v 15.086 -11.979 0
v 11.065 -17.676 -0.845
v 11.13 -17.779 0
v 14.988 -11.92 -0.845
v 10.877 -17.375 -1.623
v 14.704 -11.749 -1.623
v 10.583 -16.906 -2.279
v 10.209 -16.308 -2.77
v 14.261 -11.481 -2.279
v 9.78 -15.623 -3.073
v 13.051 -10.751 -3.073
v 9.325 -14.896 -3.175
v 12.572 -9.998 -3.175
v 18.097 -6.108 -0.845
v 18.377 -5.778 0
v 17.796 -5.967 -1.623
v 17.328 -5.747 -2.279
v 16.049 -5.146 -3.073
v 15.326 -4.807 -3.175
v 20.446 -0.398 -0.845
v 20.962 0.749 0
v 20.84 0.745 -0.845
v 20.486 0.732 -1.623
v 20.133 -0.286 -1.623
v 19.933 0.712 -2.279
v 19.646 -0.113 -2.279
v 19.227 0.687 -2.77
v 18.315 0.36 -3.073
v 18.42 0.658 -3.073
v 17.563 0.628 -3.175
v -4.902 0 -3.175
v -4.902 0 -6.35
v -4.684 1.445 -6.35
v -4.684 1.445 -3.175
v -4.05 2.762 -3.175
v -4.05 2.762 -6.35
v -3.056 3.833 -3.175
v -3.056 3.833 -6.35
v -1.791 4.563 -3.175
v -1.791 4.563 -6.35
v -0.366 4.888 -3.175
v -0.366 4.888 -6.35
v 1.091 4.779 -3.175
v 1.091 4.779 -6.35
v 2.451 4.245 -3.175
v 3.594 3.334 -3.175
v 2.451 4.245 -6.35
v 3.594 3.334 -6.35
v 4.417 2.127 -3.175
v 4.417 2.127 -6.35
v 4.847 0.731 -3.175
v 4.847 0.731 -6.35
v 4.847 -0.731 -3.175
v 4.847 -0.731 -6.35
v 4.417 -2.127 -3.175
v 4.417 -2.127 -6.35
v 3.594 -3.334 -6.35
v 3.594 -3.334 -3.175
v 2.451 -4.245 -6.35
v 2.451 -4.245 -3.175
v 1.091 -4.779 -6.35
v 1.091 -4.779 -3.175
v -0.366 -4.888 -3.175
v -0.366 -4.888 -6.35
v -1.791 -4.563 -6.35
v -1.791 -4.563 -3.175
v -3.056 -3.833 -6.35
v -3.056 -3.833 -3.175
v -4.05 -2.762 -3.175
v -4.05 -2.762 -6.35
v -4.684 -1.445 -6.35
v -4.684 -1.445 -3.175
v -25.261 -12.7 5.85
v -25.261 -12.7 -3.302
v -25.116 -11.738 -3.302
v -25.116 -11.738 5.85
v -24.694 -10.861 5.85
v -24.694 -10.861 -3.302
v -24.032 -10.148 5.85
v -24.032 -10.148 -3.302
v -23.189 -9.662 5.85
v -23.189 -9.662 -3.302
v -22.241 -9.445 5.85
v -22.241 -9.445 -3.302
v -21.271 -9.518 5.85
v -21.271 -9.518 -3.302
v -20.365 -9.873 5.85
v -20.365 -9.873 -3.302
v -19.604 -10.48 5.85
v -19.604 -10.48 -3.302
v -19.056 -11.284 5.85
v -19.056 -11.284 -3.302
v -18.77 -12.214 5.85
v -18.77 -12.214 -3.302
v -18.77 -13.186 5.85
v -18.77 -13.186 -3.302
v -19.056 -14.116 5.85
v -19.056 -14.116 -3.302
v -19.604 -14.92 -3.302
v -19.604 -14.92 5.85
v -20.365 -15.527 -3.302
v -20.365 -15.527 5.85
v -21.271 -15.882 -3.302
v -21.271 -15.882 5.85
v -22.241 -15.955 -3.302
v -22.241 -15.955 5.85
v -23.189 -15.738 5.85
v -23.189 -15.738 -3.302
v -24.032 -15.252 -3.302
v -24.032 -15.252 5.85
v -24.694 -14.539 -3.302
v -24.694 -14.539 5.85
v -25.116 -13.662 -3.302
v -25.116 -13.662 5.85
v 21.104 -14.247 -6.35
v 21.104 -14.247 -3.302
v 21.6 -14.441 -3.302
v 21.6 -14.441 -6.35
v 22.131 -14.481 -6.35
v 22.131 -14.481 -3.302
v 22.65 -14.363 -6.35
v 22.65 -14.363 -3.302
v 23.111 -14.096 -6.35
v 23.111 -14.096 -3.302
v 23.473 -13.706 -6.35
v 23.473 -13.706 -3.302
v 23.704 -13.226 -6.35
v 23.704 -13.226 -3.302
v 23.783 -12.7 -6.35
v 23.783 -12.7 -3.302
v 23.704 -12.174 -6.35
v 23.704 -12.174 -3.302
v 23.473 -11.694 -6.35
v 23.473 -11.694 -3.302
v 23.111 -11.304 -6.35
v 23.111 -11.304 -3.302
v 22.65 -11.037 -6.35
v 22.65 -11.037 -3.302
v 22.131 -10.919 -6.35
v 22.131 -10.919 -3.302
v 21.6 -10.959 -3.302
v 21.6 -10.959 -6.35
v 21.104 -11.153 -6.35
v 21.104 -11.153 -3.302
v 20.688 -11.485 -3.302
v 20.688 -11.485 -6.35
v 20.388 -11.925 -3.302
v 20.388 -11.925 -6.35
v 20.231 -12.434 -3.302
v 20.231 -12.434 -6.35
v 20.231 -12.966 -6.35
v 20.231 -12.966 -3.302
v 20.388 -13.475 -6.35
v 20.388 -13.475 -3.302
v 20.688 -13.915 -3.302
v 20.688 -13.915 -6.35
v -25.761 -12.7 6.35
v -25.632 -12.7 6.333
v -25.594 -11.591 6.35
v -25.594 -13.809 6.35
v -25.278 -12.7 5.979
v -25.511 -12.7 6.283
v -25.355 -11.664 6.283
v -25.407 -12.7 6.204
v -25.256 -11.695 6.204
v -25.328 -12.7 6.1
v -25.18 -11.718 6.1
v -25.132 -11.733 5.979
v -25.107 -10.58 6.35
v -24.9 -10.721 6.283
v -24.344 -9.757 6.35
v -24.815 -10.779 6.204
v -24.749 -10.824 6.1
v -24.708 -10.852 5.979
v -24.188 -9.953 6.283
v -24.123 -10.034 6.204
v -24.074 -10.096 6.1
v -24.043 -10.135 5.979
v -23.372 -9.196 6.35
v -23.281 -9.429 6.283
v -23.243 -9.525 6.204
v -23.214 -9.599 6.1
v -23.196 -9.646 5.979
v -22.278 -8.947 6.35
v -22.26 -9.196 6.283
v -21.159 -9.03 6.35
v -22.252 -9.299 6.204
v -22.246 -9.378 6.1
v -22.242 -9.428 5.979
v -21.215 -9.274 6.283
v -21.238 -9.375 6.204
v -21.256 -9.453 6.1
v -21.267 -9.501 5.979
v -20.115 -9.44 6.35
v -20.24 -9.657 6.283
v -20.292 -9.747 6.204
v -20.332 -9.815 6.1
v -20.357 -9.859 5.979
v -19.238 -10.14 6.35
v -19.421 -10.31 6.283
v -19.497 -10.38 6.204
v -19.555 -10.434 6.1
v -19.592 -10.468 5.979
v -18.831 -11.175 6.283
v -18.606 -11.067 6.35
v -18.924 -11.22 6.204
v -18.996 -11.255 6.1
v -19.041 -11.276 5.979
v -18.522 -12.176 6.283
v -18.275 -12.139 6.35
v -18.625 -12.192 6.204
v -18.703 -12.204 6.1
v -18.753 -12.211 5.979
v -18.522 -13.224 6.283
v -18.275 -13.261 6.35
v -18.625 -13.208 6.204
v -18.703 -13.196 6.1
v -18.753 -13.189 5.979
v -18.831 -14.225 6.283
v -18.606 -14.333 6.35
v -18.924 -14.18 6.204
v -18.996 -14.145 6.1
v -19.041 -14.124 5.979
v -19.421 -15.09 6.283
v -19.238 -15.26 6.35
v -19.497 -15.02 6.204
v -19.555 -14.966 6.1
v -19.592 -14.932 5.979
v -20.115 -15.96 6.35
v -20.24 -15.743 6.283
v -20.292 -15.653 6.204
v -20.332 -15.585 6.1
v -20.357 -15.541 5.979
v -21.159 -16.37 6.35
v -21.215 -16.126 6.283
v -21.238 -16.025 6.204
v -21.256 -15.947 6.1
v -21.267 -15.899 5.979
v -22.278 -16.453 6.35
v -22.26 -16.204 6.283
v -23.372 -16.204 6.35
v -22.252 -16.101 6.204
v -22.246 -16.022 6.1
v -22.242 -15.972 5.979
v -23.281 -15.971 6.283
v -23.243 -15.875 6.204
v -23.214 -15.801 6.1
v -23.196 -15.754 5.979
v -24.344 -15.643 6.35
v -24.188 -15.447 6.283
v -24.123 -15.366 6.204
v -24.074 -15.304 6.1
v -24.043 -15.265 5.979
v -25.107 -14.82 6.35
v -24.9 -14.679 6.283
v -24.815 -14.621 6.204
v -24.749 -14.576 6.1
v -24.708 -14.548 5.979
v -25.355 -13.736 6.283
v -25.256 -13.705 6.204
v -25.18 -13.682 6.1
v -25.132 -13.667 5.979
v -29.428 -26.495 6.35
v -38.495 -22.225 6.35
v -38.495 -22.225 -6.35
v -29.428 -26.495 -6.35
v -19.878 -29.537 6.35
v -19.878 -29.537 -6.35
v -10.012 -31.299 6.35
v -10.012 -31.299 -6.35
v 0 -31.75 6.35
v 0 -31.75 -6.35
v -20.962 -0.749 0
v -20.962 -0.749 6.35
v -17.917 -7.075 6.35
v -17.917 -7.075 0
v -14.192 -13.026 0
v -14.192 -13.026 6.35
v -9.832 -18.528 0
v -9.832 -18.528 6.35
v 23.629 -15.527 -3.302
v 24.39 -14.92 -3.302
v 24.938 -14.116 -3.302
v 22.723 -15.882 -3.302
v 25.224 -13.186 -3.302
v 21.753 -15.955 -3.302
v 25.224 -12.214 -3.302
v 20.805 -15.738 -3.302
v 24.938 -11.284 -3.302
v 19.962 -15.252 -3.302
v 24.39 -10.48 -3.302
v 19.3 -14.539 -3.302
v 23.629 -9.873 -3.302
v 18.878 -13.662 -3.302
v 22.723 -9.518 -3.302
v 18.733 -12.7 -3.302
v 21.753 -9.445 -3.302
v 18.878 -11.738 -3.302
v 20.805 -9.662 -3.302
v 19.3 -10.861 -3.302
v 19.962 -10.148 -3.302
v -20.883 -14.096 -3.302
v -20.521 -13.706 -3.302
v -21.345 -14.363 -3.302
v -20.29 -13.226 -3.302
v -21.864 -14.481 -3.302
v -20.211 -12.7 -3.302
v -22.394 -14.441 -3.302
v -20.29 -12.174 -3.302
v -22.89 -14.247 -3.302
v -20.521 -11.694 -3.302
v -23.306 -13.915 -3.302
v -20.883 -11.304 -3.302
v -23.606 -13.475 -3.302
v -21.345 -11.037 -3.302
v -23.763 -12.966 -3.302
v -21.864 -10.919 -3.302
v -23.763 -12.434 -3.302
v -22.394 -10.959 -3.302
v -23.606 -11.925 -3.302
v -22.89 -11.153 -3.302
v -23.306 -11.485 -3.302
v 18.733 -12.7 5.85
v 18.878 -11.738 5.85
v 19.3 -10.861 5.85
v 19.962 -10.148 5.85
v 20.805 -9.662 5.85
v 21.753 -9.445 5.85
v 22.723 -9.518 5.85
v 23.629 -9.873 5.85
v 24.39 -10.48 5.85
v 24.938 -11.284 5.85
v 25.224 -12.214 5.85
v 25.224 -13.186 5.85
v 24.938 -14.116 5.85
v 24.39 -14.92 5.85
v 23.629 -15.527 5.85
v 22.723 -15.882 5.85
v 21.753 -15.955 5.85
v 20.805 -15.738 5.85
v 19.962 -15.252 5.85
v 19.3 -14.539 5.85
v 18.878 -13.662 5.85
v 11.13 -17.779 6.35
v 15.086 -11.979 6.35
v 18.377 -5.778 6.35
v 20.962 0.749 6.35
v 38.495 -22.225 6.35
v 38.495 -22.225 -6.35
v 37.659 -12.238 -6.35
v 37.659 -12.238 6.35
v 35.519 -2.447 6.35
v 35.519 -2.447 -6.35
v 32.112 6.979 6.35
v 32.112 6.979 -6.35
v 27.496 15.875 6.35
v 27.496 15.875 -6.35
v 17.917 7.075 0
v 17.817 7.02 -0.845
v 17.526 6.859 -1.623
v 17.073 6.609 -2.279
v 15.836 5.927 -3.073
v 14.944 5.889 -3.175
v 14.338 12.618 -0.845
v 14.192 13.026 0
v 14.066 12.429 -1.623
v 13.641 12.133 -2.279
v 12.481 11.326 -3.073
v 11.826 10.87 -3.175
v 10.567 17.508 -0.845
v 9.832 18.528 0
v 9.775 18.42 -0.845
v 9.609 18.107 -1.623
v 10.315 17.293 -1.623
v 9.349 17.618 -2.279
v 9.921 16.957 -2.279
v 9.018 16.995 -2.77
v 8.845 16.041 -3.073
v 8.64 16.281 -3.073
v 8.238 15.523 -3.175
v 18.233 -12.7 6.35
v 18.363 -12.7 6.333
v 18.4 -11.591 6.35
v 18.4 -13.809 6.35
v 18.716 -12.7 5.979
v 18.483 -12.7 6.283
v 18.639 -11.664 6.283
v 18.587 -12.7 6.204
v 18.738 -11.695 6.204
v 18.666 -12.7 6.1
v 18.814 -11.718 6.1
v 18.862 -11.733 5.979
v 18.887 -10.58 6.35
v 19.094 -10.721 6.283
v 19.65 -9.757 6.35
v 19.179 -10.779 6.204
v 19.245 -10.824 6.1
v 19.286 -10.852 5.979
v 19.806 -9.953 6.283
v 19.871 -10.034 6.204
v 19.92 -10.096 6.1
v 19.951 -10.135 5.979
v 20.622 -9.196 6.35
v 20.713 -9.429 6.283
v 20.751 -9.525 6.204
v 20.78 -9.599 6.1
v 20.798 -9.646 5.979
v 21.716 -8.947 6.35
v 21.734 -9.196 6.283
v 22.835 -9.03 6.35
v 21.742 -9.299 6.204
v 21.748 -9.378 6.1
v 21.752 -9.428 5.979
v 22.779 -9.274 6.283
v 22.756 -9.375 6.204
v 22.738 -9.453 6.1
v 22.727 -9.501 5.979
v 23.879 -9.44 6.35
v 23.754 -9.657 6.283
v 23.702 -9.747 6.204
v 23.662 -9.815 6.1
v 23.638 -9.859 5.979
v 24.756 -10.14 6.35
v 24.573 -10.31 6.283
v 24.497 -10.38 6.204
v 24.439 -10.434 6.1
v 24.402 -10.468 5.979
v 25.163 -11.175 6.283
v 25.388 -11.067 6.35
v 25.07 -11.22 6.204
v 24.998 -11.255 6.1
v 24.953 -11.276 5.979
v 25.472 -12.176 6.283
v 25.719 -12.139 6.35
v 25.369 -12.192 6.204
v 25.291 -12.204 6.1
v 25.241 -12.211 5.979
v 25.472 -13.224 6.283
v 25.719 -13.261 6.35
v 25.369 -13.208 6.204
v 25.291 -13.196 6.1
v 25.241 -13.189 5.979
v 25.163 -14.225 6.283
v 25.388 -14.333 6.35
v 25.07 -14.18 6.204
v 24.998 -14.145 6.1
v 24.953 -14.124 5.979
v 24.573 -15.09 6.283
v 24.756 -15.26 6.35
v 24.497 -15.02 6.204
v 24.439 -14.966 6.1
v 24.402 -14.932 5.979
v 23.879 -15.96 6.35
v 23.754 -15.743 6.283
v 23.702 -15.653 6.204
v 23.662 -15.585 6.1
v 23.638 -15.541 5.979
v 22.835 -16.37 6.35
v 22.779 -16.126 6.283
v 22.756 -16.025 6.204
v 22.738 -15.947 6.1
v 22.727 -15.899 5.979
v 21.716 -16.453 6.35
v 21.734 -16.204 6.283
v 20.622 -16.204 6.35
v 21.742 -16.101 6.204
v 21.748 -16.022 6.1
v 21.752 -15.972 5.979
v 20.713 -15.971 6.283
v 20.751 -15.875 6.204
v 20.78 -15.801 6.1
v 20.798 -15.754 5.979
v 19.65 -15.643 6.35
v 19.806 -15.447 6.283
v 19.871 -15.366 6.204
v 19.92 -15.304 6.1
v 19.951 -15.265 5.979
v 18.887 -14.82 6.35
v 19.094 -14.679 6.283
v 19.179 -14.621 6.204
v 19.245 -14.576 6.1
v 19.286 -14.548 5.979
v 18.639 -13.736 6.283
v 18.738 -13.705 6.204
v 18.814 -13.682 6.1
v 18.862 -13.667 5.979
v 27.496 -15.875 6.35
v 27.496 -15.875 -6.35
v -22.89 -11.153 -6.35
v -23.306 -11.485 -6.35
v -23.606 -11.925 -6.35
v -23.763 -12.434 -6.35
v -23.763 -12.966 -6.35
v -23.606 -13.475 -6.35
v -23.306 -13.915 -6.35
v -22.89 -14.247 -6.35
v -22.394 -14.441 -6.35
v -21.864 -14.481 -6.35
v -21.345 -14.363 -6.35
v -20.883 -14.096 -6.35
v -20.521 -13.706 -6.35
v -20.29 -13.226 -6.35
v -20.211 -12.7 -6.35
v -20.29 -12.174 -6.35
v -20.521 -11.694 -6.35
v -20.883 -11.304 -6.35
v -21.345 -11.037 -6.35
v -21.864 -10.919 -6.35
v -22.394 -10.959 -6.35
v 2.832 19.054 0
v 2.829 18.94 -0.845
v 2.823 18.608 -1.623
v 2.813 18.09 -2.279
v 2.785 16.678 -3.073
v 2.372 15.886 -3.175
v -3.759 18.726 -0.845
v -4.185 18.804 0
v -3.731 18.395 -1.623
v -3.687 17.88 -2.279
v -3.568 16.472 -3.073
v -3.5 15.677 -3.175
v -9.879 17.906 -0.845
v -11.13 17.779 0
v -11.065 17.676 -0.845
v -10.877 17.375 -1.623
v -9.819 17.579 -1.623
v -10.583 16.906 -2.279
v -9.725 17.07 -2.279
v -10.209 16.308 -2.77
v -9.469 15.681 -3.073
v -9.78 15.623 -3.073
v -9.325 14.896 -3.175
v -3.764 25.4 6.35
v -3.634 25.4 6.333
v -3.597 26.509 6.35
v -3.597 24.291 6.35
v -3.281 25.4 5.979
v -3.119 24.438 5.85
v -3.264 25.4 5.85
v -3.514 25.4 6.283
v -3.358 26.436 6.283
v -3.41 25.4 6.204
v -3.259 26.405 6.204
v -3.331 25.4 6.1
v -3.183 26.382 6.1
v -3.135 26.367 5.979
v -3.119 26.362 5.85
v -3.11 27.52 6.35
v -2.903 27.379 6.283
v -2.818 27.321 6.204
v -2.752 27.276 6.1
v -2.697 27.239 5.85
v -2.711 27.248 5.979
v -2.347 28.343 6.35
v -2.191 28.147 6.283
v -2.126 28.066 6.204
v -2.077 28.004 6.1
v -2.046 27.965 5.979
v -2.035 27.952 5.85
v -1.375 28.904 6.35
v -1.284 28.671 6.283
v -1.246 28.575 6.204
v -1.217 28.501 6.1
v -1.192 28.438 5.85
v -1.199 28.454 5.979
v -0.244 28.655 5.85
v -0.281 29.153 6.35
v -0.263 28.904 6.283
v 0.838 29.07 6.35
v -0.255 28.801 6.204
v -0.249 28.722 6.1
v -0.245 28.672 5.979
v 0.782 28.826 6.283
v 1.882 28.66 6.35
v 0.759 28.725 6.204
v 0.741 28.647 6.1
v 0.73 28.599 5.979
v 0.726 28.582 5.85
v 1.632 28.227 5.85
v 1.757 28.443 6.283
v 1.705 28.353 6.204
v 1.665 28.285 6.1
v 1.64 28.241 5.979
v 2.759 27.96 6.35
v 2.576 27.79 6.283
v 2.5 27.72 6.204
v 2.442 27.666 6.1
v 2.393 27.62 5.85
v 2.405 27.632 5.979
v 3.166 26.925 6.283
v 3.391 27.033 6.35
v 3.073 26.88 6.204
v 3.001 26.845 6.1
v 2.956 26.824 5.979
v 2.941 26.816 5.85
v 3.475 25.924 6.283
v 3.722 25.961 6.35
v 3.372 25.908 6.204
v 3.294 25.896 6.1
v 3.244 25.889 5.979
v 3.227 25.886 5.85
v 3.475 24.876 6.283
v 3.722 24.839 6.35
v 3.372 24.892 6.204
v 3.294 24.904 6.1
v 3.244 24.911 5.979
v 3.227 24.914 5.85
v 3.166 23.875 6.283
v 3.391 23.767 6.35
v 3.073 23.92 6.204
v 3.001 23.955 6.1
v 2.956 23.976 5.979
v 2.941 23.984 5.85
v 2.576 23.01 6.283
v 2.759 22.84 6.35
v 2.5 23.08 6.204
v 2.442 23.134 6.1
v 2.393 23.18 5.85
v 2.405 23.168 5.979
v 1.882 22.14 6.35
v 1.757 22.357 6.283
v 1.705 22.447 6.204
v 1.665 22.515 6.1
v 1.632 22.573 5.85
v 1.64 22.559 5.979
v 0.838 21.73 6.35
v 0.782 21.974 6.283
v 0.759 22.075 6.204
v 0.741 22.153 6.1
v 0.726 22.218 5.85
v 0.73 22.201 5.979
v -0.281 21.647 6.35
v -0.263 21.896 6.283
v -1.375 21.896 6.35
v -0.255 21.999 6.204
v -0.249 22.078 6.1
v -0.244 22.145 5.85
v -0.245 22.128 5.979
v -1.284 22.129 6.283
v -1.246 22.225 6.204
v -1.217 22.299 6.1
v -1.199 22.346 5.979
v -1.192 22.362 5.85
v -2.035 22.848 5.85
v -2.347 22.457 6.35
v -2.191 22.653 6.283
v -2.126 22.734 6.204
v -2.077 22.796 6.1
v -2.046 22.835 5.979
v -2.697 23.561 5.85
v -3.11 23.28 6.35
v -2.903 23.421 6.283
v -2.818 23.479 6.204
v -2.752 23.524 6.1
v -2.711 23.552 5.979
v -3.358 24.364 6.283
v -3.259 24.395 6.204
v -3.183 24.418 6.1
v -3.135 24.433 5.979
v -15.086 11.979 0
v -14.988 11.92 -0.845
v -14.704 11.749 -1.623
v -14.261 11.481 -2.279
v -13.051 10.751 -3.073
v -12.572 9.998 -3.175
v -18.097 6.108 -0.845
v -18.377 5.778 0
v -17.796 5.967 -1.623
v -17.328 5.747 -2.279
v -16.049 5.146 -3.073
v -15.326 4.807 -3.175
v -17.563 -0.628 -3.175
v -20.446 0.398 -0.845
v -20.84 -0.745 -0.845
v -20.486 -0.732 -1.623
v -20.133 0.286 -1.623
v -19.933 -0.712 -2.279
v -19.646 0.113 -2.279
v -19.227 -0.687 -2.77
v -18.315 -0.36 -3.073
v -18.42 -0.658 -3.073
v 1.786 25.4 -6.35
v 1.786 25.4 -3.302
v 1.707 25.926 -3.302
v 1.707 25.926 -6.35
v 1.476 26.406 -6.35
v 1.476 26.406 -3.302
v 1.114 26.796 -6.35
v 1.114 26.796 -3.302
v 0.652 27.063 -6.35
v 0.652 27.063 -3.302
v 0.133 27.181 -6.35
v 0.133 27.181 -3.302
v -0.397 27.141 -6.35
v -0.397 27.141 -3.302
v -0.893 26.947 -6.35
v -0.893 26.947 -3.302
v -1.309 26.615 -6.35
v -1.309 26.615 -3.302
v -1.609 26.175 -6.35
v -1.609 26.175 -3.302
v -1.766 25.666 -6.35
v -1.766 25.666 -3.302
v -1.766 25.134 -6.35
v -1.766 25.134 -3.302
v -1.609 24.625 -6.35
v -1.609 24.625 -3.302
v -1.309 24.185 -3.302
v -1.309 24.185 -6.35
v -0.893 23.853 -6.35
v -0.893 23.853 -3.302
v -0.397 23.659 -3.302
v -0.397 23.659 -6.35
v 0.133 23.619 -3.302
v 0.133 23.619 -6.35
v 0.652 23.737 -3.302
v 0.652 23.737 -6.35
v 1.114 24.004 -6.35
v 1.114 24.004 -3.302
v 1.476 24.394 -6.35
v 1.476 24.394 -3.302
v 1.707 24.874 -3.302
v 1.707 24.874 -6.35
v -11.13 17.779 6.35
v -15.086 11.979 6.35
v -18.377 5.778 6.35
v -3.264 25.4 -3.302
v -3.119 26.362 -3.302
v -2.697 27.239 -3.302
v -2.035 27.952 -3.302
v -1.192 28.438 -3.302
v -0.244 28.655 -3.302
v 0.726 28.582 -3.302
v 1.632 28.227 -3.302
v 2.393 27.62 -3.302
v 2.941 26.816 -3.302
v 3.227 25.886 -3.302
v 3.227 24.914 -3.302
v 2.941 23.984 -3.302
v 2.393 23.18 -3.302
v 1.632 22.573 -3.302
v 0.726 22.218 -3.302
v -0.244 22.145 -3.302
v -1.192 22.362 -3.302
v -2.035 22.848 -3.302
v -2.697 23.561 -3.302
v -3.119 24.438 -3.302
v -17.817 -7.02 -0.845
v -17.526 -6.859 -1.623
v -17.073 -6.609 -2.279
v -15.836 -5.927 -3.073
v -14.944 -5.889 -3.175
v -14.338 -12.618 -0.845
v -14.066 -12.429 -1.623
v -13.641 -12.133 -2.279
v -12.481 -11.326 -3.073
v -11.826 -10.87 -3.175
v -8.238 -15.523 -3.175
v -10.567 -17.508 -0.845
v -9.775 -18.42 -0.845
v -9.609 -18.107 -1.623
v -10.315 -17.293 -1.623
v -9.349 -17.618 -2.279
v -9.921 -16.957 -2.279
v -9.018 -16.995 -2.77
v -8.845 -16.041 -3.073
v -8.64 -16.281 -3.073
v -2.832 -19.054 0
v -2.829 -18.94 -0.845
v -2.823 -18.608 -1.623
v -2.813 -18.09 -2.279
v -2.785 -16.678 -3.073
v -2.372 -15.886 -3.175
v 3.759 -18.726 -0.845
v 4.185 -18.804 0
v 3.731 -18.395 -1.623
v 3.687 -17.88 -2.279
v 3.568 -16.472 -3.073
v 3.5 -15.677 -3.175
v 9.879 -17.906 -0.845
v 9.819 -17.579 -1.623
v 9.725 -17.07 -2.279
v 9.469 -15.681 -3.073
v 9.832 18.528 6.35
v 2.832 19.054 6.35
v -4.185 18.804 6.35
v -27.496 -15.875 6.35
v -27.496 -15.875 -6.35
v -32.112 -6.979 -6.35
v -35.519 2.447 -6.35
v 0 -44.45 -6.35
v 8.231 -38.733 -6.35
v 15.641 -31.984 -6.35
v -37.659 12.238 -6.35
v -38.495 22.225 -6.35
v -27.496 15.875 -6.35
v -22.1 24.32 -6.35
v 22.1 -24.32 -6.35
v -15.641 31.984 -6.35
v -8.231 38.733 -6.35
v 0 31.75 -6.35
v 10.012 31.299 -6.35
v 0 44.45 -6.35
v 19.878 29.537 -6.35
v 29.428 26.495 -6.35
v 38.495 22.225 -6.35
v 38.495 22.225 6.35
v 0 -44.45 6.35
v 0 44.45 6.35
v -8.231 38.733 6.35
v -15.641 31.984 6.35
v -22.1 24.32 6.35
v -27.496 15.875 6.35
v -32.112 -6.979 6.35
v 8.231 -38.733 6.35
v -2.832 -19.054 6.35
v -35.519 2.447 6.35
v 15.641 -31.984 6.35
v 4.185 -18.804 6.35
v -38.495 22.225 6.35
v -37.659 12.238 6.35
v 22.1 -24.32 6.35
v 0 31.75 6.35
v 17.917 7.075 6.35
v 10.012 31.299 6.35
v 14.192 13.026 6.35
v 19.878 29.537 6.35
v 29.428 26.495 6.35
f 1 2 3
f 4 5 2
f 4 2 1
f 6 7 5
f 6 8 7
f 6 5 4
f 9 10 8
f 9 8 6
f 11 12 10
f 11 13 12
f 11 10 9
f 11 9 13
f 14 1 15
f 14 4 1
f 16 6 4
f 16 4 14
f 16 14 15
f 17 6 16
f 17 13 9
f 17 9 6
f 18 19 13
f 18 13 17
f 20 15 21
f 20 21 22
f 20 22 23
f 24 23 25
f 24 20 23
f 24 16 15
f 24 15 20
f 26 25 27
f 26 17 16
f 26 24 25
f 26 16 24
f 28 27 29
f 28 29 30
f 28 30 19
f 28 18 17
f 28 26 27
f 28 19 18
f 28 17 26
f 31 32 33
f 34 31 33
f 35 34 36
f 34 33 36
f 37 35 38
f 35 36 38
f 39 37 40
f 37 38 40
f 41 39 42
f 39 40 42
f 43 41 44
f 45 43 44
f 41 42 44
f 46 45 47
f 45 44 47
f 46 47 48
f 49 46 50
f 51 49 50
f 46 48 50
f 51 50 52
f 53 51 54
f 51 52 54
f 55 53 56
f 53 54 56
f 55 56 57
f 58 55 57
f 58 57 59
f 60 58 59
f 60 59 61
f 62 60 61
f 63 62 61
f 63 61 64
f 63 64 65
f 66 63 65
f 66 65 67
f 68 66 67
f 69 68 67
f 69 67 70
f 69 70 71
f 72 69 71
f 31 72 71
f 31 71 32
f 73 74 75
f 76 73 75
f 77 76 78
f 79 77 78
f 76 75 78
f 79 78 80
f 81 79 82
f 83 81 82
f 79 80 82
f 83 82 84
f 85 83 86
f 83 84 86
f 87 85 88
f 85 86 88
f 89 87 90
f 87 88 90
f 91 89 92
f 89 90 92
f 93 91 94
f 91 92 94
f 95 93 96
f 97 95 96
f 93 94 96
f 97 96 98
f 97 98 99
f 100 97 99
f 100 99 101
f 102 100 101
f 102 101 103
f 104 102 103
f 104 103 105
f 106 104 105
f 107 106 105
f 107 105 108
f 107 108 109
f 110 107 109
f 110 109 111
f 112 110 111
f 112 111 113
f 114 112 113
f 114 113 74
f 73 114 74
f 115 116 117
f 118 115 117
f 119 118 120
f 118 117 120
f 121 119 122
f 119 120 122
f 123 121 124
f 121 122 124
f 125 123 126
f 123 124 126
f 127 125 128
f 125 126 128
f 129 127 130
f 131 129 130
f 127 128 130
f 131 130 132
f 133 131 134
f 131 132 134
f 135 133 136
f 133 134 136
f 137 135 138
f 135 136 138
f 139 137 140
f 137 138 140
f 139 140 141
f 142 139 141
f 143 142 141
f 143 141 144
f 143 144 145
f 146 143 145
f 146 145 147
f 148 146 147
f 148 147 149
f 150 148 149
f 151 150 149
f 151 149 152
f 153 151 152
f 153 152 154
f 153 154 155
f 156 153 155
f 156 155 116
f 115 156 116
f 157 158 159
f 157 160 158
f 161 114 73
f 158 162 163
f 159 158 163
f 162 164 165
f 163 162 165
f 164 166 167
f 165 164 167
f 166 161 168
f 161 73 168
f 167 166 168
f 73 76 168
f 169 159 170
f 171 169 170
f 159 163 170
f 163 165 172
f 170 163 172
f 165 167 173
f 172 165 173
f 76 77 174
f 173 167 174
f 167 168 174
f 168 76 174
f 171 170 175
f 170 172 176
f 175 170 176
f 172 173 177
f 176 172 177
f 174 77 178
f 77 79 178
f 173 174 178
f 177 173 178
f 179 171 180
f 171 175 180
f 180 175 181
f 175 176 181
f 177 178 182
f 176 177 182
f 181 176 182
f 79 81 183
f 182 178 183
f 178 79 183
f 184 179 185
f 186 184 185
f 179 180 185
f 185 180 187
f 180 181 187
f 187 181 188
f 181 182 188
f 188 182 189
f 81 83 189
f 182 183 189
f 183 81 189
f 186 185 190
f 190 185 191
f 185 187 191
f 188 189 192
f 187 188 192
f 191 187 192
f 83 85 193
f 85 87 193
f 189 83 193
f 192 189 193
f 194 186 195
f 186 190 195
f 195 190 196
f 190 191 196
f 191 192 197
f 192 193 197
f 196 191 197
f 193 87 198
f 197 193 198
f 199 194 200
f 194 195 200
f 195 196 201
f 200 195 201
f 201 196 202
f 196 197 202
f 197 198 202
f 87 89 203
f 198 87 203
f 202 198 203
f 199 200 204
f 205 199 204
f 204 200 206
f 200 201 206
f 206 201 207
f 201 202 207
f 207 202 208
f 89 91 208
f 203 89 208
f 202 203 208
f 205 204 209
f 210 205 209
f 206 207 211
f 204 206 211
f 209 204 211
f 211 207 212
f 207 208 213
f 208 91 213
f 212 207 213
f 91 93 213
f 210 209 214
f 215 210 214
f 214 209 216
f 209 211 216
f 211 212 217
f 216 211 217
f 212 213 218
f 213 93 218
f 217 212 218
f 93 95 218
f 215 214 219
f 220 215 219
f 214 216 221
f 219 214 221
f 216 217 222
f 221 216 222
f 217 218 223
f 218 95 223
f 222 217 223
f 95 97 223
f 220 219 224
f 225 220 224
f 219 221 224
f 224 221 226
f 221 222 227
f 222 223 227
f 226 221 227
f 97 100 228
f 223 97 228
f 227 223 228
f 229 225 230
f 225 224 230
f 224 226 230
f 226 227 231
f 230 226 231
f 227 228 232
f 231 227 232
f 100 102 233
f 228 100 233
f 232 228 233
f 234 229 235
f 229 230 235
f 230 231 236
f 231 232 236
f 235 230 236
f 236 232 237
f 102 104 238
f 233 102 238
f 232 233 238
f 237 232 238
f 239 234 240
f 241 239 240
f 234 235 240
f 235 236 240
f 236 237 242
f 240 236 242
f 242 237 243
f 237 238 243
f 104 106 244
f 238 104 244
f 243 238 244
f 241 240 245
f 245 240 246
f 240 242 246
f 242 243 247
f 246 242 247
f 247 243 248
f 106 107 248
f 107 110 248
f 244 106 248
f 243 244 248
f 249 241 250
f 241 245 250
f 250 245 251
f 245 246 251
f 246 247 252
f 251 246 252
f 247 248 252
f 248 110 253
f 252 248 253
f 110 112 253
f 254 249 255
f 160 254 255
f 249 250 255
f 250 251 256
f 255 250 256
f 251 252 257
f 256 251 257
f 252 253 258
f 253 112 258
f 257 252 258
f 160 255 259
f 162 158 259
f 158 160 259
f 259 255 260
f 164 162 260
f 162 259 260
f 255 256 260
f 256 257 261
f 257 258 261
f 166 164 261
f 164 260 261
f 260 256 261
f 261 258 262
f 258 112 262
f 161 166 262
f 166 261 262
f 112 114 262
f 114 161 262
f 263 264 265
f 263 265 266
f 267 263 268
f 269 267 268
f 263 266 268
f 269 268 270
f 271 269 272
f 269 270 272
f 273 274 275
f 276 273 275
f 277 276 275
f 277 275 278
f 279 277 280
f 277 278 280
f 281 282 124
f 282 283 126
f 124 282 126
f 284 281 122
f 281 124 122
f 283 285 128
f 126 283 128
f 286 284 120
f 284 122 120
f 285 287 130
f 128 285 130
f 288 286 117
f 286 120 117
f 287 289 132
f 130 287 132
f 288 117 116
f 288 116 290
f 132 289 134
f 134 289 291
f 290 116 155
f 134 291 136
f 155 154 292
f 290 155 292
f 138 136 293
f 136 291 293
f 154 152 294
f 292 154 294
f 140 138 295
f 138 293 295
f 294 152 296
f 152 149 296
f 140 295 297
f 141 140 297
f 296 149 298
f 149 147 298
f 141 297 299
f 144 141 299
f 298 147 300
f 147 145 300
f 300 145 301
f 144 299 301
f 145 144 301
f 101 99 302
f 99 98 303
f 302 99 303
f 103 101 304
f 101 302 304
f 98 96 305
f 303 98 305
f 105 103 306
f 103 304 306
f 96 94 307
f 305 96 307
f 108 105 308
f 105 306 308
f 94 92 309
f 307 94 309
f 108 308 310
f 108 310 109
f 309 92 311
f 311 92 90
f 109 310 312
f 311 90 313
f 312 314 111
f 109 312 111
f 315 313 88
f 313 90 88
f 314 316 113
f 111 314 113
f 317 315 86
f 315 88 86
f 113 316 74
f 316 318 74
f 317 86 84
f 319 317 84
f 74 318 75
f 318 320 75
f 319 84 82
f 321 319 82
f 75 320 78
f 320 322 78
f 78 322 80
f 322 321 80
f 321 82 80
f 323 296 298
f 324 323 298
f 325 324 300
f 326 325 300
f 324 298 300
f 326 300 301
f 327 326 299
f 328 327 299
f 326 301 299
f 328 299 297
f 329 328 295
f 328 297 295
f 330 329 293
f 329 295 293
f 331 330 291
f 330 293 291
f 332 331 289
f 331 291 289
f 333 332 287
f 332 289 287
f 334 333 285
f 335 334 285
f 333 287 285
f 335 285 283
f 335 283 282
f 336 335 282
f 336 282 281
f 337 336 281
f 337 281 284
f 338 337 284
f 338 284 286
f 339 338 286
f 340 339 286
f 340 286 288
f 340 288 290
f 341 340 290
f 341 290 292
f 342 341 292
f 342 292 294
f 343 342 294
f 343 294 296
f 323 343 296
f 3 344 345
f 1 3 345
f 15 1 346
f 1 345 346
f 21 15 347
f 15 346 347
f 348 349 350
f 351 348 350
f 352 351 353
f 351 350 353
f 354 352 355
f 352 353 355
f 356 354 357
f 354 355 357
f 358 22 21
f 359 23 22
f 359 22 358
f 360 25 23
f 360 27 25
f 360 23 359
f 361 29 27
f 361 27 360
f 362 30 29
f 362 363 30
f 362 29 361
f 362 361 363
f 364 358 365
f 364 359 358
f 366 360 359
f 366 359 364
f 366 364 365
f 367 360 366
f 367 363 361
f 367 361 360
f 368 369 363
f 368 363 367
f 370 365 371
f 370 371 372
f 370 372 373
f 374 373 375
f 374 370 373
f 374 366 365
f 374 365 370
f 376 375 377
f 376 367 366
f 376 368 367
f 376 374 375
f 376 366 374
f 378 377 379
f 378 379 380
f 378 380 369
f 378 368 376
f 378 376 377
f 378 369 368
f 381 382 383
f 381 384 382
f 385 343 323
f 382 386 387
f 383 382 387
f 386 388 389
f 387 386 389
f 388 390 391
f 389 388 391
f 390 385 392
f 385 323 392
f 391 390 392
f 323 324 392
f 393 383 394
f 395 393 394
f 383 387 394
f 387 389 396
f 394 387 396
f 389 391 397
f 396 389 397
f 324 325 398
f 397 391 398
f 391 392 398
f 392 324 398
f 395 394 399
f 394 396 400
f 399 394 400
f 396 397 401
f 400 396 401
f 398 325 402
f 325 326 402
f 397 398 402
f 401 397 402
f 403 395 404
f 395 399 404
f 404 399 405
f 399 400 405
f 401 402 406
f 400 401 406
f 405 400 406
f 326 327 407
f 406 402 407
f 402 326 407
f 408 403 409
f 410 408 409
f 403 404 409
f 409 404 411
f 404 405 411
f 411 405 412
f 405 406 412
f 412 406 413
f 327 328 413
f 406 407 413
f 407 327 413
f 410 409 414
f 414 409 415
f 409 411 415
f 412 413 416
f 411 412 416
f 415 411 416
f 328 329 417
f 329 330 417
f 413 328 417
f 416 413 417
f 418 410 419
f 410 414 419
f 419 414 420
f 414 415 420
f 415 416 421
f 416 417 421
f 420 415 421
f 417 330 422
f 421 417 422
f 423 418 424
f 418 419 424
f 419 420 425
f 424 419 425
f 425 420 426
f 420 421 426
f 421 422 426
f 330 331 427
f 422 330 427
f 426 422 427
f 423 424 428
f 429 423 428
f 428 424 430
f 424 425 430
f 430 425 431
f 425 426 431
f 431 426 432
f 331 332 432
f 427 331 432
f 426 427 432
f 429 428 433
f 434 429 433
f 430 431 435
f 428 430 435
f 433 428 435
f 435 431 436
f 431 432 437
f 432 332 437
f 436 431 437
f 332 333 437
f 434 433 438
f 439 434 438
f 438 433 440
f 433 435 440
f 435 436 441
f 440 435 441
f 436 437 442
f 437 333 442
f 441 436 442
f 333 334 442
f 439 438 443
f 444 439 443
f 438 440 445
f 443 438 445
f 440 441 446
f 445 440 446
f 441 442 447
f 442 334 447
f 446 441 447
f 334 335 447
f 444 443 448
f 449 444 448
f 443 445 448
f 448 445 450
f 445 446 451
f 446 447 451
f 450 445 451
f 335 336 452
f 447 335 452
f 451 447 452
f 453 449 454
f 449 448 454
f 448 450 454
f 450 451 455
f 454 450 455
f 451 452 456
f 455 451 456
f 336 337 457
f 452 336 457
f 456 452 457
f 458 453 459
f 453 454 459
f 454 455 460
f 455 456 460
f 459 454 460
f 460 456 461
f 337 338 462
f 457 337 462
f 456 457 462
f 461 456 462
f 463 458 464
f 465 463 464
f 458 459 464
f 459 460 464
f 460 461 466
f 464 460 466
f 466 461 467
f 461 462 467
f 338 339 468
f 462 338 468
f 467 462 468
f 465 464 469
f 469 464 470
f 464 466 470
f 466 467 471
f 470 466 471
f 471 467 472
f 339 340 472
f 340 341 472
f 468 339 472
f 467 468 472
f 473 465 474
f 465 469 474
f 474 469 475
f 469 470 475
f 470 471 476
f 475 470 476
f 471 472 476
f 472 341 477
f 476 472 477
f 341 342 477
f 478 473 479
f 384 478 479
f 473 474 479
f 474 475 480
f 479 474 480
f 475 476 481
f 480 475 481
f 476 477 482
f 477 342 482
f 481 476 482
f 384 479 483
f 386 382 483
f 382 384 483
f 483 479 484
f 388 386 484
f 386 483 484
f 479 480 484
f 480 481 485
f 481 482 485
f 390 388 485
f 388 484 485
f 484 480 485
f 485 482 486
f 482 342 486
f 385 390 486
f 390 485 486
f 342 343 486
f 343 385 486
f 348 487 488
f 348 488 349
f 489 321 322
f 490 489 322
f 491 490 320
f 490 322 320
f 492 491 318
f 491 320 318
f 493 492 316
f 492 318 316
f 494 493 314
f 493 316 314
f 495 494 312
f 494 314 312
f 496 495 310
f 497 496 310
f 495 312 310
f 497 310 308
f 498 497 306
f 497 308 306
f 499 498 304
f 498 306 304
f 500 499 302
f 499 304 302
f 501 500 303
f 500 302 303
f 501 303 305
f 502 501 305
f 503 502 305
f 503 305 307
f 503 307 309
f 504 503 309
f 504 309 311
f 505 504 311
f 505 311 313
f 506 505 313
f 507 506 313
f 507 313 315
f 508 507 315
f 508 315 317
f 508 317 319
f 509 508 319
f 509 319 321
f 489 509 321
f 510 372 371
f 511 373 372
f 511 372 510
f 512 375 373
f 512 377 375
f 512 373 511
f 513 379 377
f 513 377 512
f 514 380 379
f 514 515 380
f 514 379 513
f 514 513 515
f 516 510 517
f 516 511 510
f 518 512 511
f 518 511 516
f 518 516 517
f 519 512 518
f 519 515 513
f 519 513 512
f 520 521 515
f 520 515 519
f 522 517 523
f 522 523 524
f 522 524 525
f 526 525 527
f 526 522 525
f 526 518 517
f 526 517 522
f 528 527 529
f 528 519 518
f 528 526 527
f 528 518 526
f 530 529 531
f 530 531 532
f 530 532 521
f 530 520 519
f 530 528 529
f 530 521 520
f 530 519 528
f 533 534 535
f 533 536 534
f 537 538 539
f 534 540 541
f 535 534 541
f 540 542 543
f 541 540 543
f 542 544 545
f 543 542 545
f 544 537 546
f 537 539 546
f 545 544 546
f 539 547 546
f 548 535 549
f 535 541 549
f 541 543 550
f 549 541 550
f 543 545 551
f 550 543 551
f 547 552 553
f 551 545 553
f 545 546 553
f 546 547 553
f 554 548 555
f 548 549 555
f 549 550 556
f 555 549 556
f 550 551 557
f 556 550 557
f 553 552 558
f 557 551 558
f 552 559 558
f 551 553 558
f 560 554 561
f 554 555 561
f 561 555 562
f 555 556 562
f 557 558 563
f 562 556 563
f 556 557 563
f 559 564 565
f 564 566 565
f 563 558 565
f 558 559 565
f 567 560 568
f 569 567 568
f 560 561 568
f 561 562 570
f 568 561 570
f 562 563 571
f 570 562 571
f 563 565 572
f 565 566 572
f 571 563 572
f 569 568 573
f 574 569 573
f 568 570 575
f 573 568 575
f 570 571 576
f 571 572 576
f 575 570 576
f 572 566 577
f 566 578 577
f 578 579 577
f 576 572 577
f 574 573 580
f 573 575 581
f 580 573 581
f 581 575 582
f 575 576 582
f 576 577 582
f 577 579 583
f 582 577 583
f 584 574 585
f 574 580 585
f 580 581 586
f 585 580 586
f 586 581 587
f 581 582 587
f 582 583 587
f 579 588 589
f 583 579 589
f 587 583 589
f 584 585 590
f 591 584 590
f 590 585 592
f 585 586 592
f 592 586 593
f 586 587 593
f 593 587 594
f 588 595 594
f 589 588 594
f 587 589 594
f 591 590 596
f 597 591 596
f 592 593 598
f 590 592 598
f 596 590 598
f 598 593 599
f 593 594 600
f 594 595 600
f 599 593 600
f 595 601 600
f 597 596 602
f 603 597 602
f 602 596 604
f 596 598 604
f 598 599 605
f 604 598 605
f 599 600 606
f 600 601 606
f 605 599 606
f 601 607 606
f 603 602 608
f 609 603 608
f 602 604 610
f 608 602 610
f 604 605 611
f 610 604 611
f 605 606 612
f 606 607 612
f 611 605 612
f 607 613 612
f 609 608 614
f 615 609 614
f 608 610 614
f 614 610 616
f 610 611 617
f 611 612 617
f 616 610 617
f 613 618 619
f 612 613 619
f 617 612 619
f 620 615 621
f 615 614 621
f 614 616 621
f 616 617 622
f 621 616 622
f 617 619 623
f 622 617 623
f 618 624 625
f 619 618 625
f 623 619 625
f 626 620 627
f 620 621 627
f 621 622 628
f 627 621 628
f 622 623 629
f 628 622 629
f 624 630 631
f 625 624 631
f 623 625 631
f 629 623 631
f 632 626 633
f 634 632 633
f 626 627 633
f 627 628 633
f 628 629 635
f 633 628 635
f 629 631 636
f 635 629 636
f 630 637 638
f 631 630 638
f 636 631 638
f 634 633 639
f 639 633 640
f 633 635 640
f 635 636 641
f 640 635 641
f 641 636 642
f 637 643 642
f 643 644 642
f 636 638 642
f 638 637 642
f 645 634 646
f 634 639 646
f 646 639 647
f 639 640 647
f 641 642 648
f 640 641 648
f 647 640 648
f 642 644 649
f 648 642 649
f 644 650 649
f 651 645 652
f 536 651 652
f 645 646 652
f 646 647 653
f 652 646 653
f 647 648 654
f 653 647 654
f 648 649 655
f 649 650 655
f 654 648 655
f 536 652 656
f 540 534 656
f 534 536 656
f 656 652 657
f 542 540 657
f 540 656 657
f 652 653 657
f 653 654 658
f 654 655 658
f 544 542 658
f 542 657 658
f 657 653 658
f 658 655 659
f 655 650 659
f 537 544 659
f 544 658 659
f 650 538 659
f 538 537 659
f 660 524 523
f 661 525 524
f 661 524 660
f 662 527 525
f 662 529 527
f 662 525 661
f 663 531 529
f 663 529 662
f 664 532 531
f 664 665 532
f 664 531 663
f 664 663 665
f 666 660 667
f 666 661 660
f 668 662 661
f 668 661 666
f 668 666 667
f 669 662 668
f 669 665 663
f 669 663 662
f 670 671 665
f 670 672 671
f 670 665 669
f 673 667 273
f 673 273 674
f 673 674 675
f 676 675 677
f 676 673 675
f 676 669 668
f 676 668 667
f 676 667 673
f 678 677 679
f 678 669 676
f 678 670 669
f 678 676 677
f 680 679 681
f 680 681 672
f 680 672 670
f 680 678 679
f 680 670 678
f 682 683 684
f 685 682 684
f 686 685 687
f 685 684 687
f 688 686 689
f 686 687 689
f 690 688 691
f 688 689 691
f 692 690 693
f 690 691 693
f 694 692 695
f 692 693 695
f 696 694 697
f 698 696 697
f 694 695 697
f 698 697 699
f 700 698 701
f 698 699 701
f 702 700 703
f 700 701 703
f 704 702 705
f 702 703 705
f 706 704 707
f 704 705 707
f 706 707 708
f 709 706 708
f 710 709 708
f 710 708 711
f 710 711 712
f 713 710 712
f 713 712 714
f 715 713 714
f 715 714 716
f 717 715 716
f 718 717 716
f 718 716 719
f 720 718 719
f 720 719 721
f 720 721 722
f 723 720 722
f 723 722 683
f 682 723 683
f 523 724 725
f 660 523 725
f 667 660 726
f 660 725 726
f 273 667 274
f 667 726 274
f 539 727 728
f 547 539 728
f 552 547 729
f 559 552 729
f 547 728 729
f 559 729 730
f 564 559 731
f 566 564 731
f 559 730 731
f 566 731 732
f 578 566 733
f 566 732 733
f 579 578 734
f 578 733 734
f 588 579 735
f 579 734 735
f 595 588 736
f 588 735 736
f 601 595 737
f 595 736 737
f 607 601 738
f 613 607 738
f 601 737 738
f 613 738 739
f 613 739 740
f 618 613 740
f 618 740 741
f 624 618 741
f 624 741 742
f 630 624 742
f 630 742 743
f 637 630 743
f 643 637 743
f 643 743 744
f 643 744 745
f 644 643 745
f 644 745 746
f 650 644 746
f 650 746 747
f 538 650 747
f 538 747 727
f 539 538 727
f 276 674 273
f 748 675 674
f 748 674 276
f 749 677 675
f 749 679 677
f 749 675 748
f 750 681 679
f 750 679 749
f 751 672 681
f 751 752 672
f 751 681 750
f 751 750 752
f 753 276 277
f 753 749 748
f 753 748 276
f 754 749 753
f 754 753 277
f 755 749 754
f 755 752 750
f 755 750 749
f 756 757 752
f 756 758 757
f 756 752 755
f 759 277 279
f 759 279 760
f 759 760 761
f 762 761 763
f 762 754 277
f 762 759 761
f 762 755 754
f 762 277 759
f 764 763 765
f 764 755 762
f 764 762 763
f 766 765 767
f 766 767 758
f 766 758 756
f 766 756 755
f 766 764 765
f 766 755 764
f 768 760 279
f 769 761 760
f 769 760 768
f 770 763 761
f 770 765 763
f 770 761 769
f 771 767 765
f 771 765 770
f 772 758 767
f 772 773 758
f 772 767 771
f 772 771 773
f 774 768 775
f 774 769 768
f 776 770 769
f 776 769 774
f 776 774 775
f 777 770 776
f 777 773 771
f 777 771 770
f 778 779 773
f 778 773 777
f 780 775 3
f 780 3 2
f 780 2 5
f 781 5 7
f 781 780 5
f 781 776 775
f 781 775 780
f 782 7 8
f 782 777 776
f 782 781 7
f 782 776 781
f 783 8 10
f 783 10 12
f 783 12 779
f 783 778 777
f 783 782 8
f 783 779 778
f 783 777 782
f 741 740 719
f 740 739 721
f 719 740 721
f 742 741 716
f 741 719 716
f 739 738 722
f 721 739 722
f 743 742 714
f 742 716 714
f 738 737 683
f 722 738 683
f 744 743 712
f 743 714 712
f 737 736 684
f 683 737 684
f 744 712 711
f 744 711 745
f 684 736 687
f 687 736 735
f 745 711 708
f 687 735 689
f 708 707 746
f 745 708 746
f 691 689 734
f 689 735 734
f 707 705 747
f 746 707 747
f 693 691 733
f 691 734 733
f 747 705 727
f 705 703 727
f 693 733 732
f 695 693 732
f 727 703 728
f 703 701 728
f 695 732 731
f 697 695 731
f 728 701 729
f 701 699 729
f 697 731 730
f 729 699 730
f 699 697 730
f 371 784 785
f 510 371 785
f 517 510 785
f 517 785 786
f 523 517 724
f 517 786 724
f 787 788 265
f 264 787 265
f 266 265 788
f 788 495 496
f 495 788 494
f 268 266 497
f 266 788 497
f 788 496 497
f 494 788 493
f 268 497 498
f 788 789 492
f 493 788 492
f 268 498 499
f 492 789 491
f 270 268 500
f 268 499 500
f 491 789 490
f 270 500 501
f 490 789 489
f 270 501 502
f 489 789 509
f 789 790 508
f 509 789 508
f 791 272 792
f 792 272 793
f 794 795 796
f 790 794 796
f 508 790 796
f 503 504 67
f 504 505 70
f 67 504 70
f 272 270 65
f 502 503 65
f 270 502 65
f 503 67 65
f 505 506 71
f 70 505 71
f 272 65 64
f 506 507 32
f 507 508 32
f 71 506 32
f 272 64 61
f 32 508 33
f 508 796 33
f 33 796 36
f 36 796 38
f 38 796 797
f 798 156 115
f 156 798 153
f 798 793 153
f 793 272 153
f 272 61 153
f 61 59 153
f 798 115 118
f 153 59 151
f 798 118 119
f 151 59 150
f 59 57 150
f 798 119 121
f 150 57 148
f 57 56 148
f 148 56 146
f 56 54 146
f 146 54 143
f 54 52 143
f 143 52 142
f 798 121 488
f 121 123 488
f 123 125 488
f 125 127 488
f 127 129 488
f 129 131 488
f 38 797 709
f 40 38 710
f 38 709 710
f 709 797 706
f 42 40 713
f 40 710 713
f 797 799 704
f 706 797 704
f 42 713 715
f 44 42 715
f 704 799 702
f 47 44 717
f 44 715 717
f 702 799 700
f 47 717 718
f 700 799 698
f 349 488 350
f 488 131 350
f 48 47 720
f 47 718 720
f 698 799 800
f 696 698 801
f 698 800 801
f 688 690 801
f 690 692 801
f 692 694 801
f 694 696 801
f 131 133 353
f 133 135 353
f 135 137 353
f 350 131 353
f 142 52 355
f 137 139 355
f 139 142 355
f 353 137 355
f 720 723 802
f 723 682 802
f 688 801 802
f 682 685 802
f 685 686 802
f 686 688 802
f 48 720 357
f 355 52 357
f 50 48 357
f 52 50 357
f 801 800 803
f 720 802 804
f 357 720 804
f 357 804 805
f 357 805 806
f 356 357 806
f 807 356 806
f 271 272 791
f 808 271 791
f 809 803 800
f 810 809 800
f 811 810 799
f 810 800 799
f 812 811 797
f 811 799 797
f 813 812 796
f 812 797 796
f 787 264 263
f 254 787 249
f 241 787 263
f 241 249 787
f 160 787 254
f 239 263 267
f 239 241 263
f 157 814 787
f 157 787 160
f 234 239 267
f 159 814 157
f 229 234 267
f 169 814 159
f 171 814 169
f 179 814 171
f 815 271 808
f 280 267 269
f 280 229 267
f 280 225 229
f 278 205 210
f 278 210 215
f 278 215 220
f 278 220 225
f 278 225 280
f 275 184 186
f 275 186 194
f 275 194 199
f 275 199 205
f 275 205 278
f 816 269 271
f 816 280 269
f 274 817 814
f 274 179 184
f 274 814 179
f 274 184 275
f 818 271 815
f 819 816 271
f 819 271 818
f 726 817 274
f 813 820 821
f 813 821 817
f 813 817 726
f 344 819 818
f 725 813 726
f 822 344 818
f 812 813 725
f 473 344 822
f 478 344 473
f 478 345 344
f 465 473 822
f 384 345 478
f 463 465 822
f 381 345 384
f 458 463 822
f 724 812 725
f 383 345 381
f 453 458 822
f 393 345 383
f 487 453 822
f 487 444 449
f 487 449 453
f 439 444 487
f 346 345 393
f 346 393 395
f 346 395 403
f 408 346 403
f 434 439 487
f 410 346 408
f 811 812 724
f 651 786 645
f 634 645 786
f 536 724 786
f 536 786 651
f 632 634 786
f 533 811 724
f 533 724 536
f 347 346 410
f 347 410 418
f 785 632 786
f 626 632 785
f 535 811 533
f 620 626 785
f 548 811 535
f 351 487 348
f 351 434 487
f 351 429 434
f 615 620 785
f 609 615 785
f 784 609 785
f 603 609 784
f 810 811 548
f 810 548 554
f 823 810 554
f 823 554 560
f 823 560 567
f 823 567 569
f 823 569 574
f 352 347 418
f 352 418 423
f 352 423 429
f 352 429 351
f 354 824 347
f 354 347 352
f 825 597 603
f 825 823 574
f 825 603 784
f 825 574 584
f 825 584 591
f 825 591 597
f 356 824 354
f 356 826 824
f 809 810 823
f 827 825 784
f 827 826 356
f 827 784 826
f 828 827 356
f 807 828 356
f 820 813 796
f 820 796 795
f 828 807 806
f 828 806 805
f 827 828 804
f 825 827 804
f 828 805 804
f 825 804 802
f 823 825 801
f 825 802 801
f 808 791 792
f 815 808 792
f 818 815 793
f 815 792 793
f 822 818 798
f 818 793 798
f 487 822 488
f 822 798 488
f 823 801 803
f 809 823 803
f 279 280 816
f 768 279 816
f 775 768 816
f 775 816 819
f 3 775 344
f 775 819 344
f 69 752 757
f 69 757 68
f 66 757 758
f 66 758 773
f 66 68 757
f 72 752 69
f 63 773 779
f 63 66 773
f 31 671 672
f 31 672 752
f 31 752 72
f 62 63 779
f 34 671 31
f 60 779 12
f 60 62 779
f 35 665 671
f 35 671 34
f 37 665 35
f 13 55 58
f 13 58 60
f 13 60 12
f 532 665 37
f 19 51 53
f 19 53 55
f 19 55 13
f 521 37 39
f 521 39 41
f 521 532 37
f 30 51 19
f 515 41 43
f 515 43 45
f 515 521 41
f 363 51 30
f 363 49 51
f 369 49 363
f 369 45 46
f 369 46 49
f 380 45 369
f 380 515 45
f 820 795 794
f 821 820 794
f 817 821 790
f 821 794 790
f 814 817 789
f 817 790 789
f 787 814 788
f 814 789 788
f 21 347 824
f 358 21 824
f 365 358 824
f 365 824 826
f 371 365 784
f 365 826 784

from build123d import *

# Parameters (mm, degrees)
BOSS_EXTRUDE1_DEPTH             = 6.35
BOSS_EXTRUDE1_DEPTH_BACK        = 6.35
BOSS_EXTRUDE2_START             = -12.7
BOSS_EXTRUDE2_DEPTH             = 12.7
CUT_EXTRUDE1_DEPTH              = 9.525
FILLET1_R                       = 3.175
W_0_386_DIAMETER_HOLE1_D        = 9.8044
F_9_64_0_14063_DIAMETER_HOLE1_D = 3.572002
CIRPATTERN1_COUNT               = 3
F_0_257_DIAMETER_HOLE1_D        = 6.5278
F_0_257_DIAMETER_HOLE1_DEPTH    = 9.652
FILLET2_R                       = 0.5


with BuildPart() as part:
    # Sketch1 → Boss-Extrude1 (new, two sides: drawn at the far end of the back side and taken through both)
    with BuildSketch(Plane.XY.offset(-BOSS_EXTRUDE1_DEPTH_BACK)):
        with BuildLine():
            Line((27.49630657, 15.875), (38.494829198, 22.225))
            ThreePointArc((38.494829198, 22.225), (19.878280804, 29.537115412), (0, 31.75))
            Line((0, 31.75), (0, 44.45))
            ThreePointArc((0, 44.45), (-15.640751899, 31.983653865), (-27.49630657, 15.875))
            Line((-27.49630657, 15.875), (-38.494829198, 22.225))
            ThreePointArc((-38.494829198, 22.225), (-35.519032703, 2.446538454), (-27.49630657, -15.875))
            Line((-27.49630657, -15.875), (-38.494829198, -22.225))
            ThreePointArc((-38.494829198, -22.225), (-19.878280804, -29.537115412), (0, -31.75))
            Line((0, -31.75), (0, -44.45))
            ThreePointArc((0, -44.45), (15.640751899, -31.983653865), (27.49630657, -15.875))
            Line((27.49630657, -15.875), (38.494829198, -22.225))
            ThreePointArc((38.494829198, -22.225), (35.519032703, -2.446538454), (27.49630657, 15.875))
        make_face()
        with BuildLine():
            ThreePointArc((-11.129967969, 17.779280801), (-16.817028225, 8.924127912), (-20.962292819, -0.749194604))
            ThreePointArc((-20.962292819, -0.749194604), (-16.137035591, -10.101909703), (-9.83232485, -18.528475405))
            ThreePointArc((-9.83232485, -18.528475405), (0.679992634, -19.026037615), (11.129967969, -17.779280801))
            ThreePointArc((11.129967969, -17.779280801), (16.817028225, -8.924127912), (20.962292819, 0.749194604))
            ThreePointArc((20.962292819, 0.749194604), (16.137035591, 10.101909703), (9.83232485, 18.528475405))
            ThreePointArc((9.83232485, 18.528475405), (-0.679992634, 19.026037615), (-11.129967969, 17.779280801))
        make_face(mode=Mode.SUBTRACT)
    extrude(amount=BOSS_EXTRUDE1_DEPTH + BOSS_EXTRUDE1_DEPTH_BACK)

    # Sketch3 → Boss-Extrude2 (add)
    with BuildSketch(Plane.XY.offset(6.35).offset(BOSS_EXTRUDE2_START)):
        with BuildLine():
            ThreePointArc((-11.129967969, 17.779280801), (-16.817028225, 8.924127912), (-20.962292819, -0.749194604))
            ThreePointArc((-20.962292819, -0.749194604), (-16.137035591, -10.101909703), (-9.83232485, -18.528475405))
            ThreePointArc((-9.83232485, -18.528475405), (0.679992634, -19.026037615), (11.129967969, -17.779280801))
            ThreePointArc((11.129967969, -17.779280801), (16.817028225, -8.924127912), (20.962292819, 0.749194604))
            ThreePointArc((20.962292819, 0.749194604), (16.137035591, 10.101909703), (9.83232485, 18.528475405))
            ThreePointArc((9.83232485, 18.528475405), (-0.679992634, 19.026037615), (-11.129967969, 17.779280801))
        make_face()
    extrude(amount=BOSS_EXTRUDE2_DEPTH)

    # Sketch3<2> → Cut-Extrude1 (cut)
    with BuildSketch(Plane.XY.offset(6.35)):
        with BuildLine():
            ThreePointArc((-11.129967969, 17.779280801), (-16.817028225, 8.924127912), (-20.962292819, -0.749194604))
            ThreePointArc((-20.962292819, -0.749194604), (-16.137035591, -10.101909703), (-9.83232485, -18.528475405))
            ThreePointArc((-9.83232485, -18.528475405), (0.679992634, -19.026037615), (11.129967969, -17.779280801))
            ThreePointArc((11.129967969, -17.779280801), (16.817028225, -8.924127912), (20.962292819, 0.749194604))
            ThreePointArc((20.962292819, 0.749194604), (16.137035591, 10.101909703), (9.83232485, 18.528475405))
            ThreePointArc((9.83232485, 18.528475405), (-0.679992634, 19.026037615), (-11.129967969, 17.779280801))
        make_face()
    extrude(amount=-CUT_EXTRUDE1_DEPTH, mode=Mode.SUBTRACT)

    # Fillet1
    fillet1_edges = [part.edges().sort_by_distance(p)[0] for p in [
        (-16.137035591, -10.101909703, -3.175),
        (0.679992634, -19.026037615, -3.175),
        (16.817028225, -8.924127912, -3.175),
        (16.137035591, 10.101909703, -3.175),
        (-0.679992634, 19.026037615, -3.175),
        (-16.817028225, 8.924127912, -3.175),
    ]]
    fillet(fillet1_edges, radius=FILLET1_R)

    # W (0.386) Diameter Hole1 (through all)
    with Locations(Plane.XY.offset(-3.175)):
        with Locations((0, 0)):
            Hole(W_0_386_DIAMETER_HOLE1_D / 2)

    # 9/64 (0.14063) Diameter Hole1 (through all)
    with Locations(Plane(origin=(0, 0, -6.35), x_dir=(-1, 0, 0), z_dir=(0, 0, -1))):
        with Locations((0, 25.4)):
            f_9_64_0_14063_diameter_hole1 = Hole(F_9_64_0_14063_DIAMETER_HOLE1_D / 2)

    # CirPattern1: 9/64 (0.14063) Diameter Hole1 ×3 about axis
    cirpattern1_axis = Axis((0, 0, -3.175), (0, 0, 1))
    for i in range(1, CIRPATTERN1_COUNT):
        add(f_9_64_0_14063_diameter_hole1.rotate(cirpattern1_axis, i * 360 / CIRPATTERN1_COUNT), mode=Mode.SUBTRACT)

    # F (0.257) Diameter Hole1
    with Locations(Plane.XY.offset(6.35)):
        with Locations((0, 25.4), (21.997045256, -12.7), (-21.997045256, -12.7)):
            Hole(F_0_257_DIAMETER_HOLE1_D / 2, depth=F_0_257_DIAMETER_HOLE1_DEPTH)

    # Fillet2
    fillet2_edges = [part.edges().sort_by_distance(p)[0] for p in [
        (25.260945256, -12.7, 6.35),
        (3.2639, 25.4, 6.35),
        (-18.733145256, -12.7, 6.35),
    ]]
    fillet(fillet2_edges, radius=FILLET2_R)


solid = part.part
